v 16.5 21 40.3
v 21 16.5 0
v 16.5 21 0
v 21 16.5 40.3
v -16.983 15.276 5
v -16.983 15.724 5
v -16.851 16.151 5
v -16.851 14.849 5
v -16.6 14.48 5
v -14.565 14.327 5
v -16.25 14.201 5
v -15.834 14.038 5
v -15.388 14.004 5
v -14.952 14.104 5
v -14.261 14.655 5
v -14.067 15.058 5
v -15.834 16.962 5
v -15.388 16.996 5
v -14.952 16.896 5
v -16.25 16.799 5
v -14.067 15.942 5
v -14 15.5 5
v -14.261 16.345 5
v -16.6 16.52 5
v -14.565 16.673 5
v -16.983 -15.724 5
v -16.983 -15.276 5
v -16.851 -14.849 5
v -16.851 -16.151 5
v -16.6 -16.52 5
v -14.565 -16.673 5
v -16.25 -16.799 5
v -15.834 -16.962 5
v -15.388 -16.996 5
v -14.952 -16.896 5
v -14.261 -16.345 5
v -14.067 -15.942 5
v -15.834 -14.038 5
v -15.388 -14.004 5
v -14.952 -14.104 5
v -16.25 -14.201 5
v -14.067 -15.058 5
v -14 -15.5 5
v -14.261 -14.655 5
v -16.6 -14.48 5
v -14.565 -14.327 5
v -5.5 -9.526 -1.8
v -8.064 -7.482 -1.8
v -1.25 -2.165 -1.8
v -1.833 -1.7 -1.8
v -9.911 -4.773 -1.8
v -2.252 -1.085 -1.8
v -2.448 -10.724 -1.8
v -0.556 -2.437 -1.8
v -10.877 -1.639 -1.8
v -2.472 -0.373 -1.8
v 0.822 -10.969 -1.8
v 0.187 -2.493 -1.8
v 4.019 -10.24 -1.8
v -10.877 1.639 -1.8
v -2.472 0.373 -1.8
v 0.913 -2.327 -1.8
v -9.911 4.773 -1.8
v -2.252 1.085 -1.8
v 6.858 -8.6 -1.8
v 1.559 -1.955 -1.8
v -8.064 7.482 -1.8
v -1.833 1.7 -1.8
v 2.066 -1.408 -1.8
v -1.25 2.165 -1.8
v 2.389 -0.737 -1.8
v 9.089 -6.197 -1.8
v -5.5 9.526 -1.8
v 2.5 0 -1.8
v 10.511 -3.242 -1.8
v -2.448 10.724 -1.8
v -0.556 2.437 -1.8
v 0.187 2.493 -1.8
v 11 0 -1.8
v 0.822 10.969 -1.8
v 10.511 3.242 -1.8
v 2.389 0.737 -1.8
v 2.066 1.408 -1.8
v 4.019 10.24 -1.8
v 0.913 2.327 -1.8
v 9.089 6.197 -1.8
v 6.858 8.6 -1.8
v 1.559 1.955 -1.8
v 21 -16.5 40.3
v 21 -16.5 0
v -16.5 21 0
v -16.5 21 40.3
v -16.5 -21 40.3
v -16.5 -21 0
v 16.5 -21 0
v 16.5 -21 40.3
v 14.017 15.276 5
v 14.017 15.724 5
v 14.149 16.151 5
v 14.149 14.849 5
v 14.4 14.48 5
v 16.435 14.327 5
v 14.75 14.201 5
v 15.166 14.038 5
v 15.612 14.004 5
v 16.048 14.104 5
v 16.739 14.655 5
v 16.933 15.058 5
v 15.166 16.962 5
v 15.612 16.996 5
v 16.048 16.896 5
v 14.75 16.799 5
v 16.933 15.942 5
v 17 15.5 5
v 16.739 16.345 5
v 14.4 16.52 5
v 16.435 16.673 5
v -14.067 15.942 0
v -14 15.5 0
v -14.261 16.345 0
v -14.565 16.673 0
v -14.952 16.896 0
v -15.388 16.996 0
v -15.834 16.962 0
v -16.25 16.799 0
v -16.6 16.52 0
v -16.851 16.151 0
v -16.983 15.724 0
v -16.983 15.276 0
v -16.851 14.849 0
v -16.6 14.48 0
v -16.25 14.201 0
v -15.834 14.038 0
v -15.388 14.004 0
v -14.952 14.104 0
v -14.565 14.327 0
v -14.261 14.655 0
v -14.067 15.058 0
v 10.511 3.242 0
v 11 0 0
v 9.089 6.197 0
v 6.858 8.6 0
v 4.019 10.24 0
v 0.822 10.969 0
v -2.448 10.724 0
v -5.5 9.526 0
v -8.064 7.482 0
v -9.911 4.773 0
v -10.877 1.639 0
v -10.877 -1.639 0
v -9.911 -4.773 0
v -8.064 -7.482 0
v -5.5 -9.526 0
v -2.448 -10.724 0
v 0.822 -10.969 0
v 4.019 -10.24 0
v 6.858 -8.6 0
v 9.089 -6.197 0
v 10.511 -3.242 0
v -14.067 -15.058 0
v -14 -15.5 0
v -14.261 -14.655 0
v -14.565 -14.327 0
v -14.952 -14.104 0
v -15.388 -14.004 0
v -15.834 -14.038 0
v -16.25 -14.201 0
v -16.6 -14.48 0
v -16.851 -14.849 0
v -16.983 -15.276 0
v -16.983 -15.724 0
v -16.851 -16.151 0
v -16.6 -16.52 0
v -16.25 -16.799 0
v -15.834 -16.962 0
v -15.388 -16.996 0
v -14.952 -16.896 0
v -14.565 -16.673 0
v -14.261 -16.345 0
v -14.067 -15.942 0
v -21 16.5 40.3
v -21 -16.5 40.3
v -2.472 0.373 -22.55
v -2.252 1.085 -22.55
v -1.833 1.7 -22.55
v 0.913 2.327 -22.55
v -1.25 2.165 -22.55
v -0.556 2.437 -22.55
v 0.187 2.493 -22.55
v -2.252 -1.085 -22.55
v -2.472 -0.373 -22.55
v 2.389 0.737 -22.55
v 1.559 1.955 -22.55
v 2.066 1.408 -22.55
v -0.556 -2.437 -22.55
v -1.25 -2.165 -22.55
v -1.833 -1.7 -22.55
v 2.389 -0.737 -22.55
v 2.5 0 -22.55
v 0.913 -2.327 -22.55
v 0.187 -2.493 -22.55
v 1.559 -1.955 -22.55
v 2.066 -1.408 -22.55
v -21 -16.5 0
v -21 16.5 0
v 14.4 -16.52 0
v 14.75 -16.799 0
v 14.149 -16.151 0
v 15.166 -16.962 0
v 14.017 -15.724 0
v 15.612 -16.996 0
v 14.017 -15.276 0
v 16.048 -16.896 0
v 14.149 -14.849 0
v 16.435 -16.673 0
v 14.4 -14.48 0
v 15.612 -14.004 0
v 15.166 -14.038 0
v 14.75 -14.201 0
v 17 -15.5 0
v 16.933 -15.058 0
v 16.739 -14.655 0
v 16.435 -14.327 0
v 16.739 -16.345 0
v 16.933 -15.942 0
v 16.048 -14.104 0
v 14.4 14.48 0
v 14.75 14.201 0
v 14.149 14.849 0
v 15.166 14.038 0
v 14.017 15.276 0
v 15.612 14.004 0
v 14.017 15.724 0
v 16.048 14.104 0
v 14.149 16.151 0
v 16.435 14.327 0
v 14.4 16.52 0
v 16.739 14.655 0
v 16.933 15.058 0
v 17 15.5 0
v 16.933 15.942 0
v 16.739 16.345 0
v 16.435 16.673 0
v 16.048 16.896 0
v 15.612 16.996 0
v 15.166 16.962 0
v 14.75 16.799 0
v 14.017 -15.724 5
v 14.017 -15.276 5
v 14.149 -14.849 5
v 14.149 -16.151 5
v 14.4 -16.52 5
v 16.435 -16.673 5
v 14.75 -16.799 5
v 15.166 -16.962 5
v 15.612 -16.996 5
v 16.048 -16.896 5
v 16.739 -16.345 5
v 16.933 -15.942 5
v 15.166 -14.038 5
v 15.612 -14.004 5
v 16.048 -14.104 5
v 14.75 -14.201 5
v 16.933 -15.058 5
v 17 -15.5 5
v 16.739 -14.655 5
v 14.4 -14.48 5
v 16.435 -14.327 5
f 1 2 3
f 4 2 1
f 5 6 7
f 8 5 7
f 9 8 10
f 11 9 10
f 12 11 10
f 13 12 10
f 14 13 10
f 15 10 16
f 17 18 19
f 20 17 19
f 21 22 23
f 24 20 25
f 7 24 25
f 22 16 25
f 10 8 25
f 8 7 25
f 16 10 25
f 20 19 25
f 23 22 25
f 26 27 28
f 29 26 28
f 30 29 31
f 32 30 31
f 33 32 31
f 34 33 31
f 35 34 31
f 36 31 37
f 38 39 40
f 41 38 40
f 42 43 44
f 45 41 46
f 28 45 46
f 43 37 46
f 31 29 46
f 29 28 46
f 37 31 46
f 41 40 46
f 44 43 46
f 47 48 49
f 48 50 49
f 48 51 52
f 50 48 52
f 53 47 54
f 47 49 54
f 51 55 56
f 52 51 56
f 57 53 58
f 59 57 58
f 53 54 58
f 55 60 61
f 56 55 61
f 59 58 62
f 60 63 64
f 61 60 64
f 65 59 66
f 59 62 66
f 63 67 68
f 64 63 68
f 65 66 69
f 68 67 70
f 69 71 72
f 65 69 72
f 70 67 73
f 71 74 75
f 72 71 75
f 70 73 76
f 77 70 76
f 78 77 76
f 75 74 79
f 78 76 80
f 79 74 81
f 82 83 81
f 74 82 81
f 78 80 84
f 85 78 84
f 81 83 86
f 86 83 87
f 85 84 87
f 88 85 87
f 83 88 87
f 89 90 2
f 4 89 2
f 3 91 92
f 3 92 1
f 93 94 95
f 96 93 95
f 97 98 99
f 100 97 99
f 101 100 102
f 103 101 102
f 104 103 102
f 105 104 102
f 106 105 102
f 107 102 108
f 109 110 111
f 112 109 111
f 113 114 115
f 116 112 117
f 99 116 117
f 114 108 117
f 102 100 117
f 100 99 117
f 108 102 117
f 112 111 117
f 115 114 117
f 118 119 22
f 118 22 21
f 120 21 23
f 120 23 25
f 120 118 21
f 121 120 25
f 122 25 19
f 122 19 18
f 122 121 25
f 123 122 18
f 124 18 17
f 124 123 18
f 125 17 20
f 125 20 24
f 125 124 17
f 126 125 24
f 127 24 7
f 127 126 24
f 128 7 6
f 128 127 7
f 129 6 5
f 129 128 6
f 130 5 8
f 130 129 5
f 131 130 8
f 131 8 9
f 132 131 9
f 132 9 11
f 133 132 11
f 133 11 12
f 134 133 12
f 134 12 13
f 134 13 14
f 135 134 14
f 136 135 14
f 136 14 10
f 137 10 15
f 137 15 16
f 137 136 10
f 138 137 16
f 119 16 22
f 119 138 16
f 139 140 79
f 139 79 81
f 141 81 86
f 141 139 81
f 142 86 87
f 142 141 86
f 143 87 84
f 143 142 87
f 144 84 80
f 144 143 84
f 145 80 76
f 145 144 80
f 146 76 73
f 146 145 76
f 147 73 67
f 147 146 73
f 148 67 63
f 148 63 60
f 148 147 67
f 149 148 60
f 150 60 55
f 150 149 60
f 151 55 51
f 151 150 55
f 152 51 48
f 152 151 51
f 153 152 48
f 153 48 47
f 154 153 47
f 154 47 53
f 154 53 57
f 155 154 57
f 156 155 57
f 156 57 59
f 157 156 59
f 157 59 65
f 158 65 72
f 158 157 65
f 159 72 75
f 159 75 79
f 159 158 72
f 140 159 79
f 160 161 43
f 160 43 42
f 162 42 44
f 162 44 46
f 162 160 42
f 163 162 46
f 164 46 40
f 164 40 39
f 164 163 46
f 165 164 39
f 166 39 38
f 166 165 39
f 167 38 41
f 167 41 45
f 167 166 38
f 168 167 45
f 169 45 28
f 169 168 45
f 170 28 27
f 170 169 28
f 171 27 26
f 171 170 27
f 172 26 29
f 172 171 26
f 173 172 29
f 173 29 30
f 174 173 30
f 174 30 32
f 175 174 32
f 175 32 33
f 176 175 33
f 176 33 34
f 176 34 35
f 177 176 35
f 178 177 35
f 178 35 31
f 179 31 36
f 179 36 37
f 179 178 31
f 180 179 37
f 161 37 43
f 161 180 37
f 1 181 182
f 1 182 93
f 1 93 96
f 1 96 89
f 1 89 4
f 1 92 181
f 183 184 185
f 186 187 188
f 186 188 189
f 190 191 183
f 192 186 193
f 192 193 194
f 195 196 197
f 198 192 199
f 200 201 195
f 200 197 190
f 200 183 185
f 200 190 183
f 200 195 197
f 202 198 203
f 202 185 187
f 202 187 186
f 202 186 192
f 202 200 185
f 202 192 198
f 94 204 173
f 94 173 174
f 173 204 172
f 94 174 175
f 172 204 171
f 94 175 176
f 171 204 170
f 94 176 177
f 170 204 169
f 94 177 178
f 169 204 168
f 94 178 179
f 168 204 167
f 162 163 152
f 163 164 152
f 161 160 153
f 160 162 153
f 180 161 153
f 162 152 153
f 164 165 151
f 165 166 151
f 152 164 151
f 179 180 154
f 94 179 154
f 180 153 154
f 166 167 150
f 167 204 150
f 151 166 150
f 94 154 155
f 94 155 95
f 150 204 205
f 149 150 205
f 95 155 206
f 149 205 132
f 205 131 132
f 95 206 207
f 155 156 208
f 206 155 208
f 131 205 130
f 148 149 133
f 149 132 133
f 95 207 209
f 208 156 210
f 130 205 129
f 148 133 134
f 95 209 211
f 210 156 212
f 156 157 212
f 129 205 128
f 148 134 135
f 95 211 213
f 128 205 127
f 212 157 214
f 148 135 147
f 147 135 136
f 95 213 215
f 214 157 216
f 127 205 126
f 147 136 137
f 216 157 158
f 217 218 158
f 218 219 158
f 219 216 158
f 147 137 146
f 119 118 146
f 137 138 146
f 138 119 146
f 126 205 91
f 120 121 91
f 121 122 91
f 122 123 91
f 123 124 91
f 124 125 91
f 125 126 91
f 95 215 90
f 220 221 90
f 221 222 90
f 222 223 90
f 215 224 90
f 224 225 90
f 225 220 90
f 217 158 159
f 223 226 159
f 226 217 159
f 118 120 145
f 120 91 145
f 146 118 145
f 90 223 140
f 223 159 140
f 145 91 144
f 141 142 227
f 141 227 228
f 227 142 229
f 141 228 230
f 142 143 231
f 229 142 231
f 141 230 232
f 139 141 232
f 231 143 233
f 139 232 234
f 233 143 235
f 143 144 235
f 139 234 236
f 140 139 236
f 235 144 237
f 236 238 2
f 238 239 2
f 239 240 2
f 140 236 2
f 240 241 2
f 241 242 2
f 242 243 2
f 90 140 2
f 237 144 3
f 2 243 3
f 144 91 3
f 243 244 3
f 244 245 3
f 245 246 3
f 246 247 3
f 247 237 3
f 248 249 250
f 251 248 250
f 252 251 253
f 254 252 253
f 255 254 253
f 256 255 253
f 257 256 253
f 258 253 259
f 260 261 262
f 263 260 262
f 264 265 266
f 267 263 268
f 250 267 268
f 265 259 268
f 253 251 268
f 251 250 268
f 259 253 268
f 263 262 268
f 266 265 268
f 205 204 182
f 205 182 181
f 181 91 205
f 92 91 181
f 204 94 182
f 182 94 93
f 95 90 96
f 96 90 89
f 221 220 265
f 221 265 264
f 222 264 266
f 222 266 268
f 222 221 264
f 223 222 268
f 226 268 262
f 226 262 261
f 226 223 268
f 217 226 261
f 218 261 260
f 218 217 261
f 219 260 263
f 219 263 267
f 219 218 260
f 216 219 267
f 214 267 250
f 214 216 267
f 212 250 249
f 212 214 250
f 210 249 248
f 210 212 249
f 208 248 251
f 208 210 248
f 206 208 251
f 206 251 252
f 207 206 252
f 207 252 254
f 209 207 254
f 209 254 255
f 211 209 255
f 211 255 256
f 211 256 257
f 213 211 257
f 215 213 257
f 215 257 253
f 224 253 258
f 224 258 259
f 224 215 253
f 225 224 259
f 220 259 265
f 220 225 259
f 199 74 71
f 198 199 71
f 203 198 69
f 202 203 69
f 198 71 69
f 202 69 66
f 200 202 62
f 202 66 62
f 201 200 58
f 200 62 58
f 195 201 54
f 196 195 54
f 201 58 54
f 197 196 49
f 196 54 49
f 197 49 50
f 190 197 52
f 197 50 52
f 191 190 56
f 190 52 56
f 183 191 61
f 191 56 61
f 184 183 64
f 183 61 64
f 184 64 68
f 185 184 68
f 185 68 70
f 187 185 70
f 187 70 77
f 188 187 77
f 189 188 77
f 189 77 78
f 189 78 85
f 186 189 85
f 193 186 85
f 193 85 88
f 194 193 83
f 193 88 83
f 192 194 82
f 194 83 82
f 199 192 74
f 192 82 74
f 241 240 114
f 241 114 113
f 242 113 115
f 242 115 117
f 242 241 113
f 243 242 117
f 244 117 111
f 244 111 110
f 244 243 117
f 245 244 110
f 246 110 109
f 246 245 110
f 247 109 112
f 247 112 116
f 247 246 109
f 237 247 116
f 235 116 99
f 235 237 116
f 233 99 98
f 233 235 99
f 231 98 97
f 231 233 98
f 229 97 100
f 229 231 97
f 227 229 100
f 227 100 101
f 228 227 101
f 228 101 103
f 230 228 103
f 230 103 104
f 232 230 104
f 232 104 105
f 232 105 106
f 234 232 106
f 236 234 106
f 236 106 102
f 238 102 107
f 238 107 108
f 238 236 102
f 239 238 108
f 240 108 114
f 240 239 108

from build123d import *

# Parameters (mm, degrees)
SKETCH1_W           = 42
SKETCH1_H           = 42
BOSS_EXTRUDE1_DEPTH = 40.3
SKETCH1_3_R         = 1.5
CUT_EXTRUDE1_DEPTH  = 5
SKETCH1_4_R         = 11
BOSS_EXTRUDE2_DEPTH = 1.8
CHAMFER1_SIZE       = 4.5
SKETCH2_R           = 2.5
BOSS_EXTRUDE3_DEPTH = 20.75


with BuildPart() as part:
    # Sketch1 → Boss-Extrude1 (new body)
    with BuildSketch(Plane.XY):
        Rectangle(SKETCH1_W, SKETCH1_H)
    extrude(amount=BOSS_EXTRUDE1_DEPTH)

    # Sketch1<3> → Cut-Extrude1 (cut)
    with BuildSketch(Plane.XY):
        with Locations((15.5, 15.5)):
            Circle(SKETCH1_3_R)
        with Locations((15.5, -15.5)):
            Circle(SKETCH1_3_R)
        with Locations((-15.5, -15.5)):
            Circle(SKETCH1_3_R)
        with Locations((-15.5, 15.5)):
            Circle(SKETCH1_3_R)
    extrude(amount=CUT_EXTRUDE1_DEPTH, mode=Mode.SUBTRACT)

    # Sketch1<4> → Boss-Extrude2 (add)
    with BuildSketch(Plane.XY):
        Circle(SKETCH1_4_R)
    extrude(amount=-BOSS_EXTRUDE2_DEPTH)

    # Chamfer1
    chamfer1_edges = [part.edges().sort_by_distance(p)[0] for p in [
        (21, 21, 20.15),
        (21, -21, 20.15),
        (-21, -21, 20.15),
        (-21, 21, 20.15),
    ]]
    chamfer(chamfer1_edges, length=CHAMFER1_SIZE)

    # Sketch2 → Boss-Extrude3 (add)
    with BuildSketch(Plane(origin=(0, 0, -1.8), x_dir=(-1, 0, 0), z_dir=(0, 0, -1))):
        Circle(SKETCH2_R)
    extrude(amount=BOSS_EXTRUDE3_DEPTH)


solid = part.part
